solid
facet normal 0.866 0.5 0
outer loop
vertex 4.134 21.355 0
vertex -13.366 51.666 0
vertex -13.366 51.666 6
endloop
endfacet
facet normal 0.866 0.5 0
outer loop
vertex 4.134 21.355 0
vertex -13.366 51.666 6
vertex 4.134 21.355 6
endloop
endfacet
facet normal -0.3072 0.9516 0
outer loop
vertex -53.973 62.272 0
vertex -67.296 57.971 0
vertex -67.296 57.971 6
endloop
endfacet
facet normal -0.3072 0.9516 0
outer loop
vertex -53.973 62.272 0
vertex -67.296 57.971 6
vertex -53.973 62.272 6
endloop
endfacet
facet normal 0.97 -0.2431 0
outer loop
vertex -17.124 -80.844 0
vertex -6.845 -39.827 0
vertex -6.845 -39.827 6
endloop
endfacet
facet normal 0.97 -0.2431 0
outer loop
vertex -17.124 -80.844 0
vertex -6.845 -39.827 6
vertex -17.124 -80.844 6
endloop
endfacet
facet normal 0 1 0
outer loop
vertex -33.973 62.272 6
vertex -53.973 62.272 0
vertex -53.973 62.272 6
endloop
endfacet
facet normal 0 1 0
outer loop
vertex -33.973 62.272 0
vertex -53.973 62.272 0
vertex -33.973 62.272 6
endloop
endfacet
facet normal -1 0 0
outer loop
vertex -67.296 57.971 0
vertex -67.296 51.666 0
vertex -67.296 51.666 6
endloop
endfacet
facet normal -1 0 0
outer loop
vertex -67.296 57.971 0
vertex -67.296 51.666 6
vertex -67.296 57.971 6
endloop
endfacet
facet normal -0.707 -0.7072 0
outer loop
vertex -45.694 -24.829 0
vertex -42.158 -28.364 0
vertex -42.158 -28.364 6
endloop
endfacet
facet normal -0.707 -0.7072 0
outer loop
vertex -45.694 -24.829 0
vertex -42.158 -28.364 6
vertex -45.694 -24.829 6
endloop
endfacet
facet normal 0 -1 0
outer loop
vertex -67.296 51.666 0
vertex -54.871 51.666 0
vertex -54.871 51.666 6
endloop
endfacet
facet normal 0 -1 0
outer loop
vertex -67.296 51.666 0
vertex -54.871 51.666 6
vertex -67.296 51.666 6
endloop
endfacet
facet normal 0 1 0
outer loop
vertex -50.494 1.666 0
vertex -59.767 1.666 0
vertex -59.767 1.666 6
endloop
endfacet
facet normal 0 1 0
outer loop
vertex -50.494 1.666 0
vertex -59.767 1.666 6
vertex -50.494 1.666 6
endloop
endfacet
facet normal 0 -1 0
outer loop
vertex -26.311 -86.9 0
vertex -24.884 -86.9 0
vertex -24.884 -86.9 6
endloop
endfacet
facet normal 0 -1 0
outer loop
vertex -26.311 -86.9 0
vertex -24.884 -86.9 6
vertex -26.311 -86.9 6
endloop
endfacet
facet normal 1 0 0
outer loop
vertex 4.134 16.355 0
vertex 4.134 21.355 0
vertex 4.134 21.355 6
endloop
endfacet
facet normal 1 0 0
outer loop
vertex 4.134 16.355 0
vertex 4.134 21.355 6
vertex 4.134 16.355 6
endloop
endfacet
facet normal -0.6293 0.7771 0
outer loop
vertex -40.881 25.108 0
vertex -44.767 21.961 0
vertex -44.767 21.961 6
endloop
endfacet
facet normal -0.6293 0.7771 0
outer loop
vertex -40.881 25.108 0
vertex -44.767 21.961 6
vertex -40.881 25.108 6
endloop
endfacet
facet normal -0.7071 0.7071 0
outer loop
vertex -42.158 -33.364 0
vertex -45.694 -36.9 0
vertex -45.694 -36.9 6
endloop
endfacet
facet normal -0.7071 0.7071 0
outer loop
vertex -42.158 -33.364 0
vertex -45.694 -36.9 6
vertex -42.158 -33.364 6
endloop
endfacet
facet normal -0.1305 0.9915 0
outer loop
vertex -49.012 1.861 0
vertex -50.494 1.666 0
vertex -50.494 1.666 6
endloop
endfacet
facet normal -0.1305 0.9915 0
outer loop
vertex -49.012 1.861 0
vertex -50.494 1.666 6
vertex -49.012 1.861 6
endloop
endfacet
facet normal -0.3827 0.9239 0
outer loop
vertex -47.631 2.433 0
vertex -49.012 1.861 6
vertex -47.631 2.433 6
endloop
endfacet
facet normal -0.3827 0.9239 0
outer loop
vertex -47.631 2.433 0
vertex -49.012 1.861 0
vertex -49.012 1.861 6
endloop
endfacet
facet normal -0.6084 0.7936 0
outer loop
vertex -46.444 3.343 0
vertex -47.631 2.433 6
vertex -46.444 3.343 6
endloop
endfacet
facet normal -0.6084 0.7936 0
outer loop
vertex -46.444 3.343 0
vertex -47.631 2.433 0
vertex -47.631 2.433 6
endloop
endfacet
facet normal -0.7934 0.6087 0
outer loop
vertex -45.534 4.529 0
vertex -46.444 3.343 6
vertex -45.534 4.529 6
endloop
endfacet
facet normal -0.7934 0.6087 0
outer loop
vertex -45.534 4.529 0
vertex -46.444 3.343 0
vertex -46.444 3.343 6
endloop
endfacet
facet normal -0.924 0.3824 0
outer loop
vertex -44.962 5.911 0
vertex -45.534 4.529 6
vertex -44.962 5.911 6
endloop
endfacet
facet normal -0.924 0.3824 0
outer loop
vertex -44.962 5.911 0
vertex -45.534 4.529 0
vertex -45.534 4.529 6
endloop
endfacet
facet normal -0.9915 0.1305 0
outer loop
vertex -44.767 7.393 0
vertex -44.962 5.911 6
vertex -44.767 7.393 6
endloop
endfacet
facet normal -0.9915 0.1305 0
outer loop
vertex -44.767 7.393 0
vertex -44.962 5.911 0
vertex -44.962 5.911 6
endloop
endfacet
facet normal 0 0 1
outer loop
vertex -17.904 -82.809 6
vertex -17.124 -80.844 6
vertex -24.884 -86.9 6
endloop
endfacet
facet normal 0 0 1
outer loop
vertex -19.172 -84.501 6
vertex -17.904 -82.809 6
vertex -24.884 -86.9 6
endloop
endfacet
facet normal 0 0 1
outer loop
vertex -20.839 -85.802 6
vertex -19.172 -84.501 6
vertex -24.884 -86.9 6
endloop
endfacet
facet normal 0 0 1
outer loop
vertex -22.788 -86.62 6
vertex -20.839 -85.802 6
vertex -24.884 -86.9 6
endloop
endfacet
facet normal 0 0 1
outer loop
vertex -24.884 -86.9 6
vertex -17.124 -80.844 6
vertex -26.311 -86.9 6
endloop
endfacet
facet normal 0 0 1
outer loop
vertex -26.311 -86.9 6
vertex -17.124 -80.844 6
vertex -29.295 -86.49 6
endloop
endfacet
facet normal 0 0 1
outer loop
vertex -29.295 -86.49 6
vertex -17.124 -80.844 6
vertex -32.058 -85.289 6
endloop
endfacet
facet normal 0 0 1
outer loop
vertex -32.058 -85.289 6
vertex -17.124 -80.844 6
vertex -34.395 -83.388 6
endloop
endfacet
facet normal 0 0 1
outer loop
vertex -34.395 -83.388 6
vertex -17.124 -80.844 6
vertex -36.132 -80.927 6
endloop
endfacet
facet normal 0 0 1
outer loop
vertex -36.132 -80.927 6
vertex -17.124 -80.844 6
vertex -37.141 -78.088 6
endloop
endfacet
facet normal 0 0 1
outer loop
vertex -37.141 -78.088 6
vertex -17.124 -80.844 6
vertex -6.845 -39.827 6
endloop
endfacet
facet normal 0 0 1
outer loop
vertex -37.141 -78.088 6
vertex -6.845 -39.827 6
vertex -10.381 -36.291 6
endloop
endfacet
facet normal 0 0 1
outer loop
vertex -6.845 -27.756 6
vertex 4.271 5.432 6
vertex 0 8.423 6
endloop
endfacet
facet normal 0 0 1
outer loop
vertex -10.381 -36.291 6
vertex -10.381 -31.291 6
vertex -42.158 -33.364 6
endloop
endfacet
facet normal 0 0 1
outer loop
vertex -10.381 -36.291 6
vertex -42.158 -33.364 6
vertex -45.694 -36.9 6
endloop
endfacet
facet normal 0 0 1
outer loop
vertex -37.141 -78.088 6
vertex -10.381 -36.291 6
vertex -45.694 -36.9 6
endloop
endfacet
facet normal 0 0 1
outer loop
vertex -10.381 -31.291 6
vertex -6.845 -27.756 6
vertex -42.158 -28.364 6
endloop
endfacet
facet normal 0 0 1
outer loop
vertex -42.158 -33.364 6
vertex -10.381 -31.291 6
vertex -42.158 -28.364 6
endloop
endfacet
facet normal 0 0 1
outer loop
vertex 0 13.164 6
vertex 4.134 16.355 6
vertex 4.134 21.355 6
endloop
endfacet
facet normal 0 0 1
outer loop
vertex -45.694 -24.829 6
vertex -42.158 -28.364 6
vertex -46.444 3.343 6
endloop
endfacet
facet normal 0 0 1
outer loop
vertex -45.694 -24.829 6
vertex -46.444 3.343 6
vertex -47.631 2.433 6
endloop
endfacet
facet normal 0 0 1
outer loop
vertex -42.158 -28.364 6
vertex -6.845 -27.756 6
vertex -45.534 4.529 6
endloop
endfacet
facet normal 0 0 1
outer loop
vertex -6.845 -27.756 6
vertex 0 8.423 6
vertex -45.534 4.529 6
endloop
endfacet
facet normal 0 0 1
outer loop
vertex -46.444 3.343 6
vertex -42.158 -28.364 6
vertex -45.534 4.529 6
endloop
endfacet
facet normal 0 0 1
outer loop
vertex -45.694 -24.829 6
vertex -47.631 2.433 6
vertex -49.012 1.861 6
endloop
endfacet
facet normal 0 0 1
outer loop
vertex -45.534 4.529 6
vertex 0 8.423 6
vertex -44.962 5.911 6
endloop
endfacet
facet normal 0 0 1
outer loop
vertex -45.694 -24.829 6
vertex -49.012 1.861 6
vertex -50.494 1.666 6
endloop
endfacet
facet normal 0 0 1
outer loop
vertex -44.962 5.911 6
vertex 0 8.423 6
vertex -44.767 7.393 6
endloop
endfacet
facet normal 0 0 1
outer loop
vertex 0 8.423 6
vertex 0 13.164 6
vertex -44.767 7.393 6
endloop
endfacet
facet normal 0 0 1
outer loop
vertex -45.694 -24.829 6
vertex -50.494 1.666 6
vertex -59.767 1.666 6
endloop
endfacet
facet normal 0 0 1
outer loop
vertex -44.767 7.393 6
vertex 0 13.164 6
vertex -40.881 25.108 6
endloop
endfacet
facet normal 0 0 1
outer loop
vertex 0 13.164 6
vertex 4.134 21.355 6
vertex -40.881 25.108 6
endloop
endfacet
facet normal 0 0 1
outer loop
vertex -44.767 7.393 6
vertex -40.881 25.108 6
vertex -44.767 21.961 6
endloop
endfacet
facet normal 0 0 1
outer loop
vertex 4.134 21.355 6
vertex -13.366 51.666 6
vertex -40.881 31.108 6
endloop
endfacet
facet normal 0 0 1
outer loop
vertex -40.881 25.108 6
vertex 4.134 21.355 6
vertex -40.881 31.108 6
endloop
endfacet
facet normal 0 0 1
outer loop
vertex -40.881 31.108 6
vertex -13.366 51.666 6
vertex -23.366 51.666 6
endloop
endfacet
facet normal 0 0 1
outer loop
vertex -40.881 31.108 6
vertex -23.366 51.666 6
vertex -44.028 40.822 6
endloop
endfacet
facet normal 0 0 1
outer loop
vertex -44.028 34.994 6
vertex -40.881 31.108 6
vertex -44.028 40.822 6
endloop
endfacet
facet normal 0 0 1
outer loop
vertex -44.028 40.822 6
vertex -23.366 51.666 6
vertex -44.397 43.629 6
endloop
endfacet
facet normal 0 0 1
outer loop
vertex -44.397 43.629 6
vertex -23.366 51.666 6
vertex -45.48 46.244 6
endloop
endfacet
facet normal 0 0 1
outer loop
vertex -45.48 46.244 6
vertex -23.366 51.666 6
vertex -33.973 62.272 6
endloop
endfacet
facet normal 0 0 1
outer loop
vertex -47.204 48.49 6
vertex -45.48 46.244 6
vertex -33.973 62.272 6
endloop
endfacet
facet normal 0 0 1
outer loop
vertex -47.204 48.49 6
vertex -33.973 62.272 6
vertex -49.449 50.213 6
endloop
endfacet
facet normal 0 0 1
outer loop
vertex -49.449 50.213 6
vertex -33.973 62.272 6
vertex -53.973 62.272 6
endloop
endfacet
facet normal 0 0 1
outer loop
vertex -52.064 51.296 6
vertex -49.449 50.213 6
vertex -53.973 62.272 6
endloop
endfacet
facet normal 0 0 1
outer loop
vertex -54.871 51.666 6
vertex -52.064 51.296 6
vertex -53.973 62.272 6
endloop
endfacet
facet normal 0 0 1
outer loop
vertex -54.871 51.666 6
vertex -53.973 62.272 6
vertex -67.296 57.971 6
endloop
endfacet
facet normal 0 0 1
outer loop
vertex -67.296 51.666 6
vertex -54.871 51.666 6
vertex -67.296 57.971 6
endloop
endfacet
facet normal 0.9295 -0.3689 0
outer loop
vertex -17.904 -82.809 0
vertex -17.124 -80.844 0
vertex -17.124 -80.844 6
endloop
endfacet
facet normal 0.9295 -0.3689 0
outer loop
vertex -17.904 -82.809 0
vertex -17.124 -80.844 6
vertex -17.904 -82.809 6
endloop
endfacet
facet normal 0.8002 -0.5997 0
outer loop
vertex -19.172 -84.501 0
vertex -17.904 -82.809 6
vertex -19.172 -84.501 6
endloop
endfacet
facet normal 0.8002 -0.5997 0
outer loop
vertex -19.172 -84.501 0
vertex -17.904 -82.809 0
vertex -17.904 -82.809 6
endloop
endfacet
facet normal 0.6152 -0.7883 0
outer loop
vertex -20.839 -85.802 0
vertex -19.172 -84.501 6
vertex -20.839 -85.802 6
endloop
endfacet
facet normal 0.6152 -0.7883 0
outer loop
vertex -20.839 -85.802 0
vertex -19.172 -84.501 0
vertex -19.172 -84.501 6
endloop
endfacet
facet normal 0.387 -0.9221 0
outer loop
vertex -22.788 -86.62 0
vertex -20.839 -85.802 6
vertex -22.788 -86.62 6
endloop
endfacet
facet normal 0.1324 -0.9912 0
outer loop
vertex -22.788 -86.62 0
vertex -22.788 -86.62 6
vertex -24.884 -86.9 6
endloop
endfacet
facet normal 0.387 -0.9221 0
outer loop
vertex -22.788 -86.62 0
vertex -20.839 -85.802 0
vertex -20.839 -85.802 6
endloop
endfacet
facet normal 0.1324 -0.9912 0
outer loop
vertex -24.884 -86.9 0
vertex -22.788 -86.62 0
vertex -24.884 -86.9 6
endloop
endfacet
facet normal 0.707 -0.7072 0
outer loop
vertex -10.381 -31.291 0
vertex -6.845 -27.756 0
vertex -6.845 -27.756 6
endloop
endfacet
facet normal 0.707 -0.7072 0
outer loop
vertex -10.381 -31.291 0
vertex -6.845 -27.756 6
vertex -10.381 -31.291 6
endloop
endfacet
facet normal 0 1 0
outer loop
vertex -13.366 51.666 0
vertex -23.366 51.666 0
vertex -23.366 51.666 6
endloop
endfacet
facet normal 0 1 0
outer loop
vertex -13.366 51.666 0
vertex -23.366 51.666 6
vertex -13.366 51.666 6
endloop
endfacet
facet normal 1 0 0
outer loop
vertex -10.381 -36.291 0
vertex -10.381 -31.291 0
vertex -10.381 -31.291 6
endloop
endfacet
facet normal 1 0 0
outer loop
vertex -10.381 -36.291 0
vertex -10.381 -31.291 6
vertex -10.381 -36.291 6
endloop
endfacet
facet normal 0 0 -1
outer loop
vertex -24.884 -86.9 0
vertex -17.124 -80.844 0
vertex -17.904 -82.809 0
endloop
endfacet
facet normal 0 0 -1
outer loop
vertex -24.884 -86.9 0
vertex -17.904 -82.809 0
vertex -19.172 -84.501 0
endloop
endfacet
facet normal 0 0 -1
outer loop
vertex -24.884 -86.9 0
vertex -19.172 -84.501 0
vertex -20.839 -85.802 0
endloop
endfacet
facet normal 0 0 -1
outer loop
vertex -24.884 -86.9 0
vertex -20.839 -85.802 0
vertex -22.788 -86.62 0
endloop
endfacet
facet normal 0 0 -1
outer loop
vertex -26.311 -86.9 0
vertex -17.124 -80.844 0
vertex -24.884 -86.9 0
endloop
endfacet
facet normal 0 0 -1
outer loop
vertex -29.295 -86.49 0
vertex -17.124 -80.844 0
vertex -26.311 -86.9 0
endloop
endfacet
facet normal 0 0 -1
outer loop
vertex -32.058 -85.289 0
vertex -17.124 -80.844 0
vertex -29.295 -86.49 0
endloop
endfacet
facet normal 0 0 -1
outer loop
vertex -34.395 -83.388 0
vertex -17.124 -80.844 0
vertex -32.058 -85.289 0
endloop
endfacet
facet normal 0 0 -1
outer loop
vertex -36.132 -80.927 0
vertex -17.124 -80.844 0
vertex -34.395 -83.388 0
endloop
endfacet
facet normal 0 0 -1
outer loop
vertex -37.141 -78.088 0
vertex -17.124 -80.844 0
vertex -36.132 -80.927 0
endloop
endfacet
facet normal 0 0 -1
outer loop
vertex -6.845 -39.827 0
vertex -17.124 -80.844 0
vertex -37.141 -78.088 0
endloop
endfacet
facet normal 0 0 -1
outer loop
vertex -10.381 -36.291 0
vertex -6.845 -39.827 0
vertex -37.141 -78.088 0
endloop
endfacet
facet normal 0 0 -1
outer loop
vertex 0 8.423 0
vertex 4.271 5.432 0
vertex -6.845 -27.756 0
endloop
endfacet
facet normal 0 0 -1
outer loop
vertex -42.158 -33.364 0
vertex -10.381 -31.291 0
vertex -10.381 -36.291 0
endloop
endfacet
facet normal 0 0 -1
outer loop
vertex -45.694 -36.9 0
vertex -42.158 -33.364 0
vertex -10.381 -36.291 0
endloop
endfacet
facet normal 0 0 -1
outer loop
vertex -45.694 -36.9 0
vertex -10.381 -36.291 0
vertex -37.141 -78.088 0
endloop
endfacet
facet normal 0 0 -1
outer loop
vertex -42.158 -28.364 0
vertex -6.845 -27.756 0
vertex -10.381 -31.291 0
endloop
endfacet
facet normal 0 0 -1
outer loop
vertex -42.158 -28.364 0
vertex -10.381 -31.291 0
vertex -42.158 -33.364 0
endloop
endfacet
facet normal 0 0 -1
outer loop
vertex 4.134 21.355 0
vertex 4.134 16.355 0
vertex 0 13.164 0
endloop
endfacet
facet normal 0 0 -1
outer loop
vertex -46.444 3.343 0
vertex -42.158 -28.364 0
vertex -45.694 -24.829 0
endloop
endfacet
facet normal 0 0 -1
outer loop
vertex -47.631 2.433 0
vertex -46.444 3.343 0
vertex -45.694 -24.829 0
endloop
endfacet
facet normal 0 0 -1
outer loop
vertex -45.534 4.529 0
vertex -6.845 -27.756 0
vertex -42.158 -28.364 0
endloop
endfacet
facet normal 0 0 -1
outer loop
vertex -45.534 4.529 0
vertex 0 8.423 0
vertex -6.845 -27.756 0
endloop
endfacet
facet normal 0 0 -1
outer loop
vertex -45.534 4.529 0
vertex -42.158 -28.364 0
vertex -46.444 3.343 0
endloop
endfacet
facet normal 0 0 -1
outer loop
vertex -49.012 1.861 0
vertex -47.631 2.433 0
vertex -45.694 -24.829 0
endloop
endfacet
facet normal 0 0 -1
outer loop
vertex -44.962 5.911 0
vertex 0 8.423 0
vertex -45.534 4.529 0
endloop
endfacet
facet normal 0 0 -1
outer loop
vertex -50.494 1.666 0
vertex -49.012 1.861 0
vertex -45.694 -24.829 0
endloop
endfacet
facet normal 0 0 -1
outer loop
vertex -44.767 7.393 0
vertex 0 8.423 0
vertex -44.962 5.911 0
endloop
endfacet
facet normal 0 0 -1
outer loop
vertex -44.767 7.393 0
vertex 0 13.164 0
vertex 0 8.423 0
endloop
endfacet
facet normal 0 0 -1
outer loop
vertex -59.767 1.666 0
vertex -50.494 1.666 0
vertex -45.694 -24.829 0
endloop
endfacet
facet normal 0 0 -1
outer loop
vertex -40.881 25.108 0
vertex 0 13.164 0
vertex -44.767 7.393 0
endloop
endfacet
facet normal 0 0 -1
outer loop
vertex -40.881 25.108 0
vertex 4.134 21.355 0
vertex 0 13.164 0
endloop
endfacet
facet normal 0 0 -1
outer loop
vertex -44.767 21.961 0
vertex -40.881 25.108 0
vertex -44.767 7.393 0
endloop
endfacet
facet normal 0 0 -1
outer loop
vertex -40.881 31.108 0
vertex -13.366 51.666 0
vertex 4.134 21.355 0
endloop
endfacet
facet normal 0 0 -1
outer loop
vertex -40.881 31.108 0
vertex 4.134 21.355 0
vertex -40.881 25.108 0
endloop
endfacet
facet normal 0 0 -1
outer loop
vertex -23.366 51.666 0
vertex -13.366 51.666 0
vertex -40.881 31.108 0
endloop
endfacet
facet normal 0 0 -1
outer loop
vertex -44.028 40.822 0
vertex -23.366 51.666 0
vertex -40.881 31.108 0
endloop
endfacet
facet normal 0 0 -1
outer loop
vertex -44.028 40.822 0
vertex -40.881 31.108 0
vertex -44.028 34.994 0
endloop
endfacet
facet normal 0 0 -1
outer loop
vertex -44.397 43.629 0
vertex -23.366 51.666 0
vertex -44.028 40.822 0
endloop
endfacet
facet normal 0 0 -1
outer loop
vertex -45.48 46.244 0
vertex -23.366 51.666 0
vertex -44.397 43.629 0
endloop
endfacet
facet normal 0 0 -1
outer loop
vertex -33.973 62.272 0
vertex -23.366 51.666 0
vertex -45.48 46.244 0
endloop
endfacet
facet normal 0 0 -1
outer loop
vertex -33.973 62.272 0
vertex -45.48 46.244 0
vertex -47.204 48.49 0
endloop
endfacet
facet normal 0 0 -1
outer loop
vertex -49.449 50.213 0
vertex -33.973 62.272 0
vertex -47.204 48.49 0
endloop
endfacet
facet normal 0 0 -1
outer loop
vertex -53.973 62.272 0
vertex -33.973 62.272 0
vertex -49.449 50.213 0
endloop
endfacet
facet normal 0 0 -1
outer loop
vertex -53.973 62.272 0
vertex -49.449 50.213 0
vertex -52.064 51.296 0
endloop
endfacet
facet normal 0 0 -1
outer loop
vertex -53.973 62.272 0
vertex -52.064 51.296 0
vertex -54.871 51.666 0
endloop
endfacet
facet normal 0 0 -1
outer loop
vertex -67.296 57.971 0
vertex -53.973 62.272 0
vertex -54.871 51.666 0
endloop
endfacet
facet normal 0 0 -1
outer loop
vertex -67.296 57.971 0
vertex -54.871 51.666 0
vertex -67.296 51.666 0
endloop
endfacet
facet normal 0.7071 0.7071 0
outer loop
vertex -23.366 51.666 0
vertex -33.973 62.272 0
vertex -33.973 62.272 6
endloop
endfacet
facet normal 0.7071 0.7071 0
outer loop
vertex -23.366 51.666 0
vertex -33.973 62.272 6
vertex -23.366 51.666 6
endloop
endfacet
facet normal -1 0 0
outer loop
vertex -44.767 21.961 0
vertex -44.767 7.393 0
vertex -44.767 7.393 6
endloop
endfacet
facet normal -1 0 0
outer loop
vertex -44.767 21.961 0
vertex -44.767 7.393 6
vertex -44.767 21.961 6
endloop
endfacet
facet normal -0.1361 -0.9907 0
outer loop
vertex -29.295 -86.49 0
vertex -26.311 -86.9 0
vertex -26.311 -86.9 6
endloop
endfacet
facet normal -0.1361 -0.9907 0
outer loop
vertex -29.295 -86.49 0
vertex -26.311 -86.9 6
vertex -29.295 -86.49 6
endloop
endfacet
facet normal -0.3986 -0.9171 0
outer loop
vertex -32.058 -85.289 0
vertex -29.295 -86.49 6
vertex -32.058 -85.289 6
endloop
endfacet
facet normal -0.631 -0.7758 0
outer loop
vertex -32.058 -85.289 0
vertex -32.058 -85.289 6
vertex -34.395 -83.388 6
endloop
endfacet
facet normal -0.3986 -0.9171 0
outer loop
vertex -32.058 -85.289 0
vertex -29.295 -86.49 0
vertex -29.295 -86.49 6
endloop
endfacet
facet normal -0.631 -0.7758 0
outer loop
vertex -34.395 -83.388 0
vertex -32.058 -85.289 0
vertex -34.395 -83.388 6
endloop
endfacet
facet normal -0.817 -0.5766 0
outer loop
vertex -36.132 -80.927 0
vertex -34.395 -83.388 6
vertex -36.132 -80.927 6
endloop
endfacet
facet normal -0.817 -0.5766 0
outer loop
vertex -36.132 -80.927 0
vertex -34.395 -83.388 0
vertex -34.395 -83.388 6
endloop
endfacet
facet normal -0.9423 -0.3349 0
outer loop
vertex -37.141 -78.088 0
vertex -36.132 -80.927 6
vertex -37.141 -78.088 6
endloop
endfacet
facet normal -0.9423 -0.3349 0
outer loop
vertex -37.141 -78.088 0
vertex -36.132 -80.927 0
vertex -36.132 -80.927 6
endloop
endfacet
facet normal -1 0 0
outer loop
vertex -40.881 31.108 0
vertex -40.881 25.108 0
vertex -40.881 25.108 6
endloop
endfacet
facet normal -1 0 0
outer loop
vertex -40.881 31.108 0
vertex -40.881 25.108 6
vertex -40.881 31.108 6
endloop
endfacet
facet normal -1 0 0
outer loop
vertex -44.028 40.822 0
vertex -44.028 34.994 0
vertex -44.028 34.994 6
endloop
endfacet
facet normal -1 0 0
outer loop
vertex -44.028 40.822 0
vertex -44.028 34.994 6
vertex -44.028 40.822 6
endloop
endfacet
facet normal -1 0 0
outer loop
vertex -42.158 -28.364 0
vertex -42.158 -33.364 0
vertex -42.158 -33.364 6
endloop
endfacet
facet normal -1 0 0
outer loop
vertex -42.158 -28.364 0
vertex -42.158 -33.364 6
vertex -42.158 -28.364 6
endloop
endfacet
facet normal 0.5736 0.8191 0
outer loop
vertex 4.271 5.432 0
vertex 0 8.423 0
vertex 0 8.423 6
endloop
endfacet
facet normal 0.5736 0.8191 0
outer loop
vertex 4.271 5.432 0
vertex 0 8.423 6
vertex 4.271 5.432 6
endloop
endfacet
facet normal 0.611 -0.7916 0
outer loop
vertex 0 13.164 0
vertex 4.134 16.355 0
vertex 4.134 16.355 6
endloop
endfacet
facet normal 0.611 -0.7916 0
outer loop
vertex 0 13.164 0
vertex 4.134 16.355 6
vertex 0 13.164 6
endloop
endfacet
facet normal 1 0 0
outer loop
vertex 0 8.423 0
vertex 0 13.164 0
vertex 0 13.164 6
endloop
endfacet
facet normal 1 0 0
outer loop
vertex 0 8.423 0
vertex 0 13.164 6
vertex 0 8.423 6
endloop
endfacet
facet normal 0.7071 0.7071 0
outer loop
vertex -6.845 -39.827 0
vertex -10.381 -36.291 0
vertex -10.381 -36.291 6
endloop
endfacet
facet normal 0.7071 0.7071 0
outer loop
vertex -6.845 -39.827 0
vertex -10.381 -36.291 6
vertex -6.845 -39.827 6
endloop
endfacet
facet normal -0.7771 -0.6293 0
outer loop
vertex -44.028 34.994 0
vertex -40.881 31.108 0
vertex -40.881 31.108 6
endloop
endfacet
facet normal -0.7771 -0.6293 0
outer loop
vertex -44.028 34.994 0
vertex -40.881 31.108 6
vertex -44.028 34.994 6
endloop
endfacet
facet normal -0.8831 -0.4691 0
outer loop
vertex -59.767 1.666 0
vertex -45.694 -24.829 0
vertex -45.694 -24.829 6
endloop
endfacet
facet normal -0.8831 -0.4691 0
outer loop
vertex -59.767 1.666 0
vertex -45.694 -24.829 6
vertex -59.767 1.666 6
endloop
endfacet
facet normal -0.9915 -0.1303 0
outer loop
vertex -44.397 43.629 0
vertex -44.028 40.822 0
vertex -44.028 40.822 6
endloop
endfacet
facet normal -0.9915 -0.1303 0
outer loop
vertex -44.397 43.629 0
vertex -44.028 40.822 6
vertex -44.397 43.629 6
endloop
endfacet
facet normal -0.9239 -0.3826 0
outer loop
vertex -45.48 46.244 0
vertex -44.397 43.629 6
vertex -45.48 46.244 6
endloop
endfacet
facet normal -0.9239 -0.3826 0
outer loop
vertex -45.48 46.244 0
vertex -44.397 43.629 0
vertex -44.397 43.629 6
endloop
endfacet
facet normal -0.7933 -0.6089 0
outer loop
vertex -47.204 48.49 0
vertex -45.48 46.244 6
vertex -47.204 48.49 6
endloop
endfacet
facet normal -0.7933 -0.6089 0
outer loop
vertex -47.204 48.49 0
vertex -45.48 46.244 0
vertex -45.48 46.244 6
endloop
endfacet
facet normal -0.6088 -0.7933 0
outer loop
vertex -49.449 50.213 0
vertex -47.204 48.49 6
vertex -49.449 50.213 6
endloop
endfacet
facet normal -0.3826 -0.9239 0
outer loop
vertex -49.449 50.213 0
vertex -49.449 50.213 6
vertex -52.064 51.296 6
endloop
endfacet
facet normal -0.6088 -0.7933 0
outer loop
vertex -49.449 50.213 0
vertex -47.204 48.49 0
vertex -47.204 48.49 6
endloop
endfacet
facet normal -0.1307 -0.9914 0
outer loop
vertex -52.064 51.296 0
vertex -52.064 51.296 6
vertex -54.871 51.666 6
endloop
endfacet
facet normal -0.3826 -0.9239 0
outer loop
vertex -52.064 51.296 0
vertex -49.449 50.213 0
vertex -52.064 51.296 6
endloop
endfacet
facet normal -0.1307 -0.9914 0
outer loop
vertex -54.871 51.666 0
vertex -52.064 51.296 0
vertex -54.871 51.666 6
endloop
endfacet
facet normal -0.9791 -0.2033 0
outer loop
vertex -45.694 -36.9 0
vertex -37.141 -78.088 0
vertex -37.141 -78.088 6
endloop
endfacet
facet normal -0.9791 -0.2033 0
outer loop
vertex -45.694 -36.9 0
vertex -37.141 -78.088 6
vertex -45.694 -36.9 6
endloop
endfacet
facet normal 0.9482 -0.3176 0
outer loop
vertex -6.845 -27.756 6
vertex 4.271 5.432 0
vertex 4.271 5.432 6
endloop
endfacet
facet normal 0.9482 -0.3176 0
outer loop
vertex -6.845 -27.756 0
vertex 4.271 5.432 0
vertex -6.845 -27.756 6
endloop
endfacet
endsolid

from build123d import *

# Parameters (mm, degrees)
BOSS_EXTRUDE1_DEPTH = 6


with BuildPart() as part:
    # Sketch1 → Boss-Extrude1 (new body)
    with BuildSketch(Plane.XY):
        with BuildLine():
            Line((-53.972535853, 62.272181808), (-33.972535853, 62.272181808))
            Line((-33.972535853, 62.272181808), (-23.365934135, 51.66558009))
            Line((-23.365934135, 51.66558009), (-13.365934135, 51.66558009))
            Line((-13.365934135, 51.66558009), (4.134065865, 21.354690958))
            Line((4.134065865, 21.354690958), (4.134065865, 16.354690958))
            Line((4.134065865, 16.354690958), (0, 13.164382856))
            Line((0, 13.164382856), (0, 8.42299495))
            Line((0, 8.42299495), (4.271457393, 5.432088284))
            Line((4.271457393, 5.432088284), (-6.845344252, -27.755510623))
            Line((-6.845344252, -27.755510623), (-10.380878157, -31.291044529))
            Line((-10.380878157, -31.291044529), (-10.380878157, -36.291044529))
            Line((-10.380878157, -36.291044529), (-6.845344252, -39.826578434))
            Line((-6.845344252, -39.826578434), (-17.123685718, -80.844353089))
            ThreePointArc((-17.123685718, -80.844353089), (-19.962191865, -85.206806077), (-24.883760746, -86.899813152))
            Line((-24.883760746, -86.899813152), (-26.310778978, -86.899813152))
            ThreePointArc((-26.310778978, -86.899813152), (-33.291799073, -84.418493944), (-37.140699325, -78.087810456))
            Line((-37.140699325, -78.087810456), (-45.693891705, -36.899813152))
            Line((-45.693891705, -36.899813152), (-42.158357799, -33.364279246))
            Line((-42.158357799, -33.364279246), (-42.158357799, -28.364279246))
            Line((-42.158357799, -28.364279246), (-45.693891705, -24.828745341))
            Line((-45.693891705, -24.828745341), (-59.766941125, 1.66558009))
            Line((-59.766941125, 1.66558009), (-50.494368268, 1.66558009))
            ThreePointArc((-50.494368268, 1.66558009), (-46.444465696, 3.343104662), (-44.766941125, 7.393007234))
            Line((-44.766941125, 7.393007234), (-44.766941125, 21.96147854))
            Line((-44.766941125, 21.96147854), (-40.881118733, 25.10796616))
            Line((-40.881118733, 25.10796616), (-40.881118733, 31.10796616))
            Line((-40.881118733, 31.10796616), (-44.027606353, 34.993788551))
            Line((-44.027606353, 34.993788551), (-44.027606353, 40.822331304))
            ThreePointArc((-44.027606353, 40.822331304), (-47.203520392, 48.489666051), (-54.870855139, 51.66558009))
            Line((-54.870855139, 51.66558009), (-67.295502145, 51.66558009))
            Line((-67.295502145, 51.66558009), (-67.295502145, 57.971185507))
            Line((-67.295502145, 57.971185507), (-53.972535853, 62.272181808))
        make_face()
    extrude(amount=BOSS_EXTRUDE1_DEPTH)


solid = part.part
